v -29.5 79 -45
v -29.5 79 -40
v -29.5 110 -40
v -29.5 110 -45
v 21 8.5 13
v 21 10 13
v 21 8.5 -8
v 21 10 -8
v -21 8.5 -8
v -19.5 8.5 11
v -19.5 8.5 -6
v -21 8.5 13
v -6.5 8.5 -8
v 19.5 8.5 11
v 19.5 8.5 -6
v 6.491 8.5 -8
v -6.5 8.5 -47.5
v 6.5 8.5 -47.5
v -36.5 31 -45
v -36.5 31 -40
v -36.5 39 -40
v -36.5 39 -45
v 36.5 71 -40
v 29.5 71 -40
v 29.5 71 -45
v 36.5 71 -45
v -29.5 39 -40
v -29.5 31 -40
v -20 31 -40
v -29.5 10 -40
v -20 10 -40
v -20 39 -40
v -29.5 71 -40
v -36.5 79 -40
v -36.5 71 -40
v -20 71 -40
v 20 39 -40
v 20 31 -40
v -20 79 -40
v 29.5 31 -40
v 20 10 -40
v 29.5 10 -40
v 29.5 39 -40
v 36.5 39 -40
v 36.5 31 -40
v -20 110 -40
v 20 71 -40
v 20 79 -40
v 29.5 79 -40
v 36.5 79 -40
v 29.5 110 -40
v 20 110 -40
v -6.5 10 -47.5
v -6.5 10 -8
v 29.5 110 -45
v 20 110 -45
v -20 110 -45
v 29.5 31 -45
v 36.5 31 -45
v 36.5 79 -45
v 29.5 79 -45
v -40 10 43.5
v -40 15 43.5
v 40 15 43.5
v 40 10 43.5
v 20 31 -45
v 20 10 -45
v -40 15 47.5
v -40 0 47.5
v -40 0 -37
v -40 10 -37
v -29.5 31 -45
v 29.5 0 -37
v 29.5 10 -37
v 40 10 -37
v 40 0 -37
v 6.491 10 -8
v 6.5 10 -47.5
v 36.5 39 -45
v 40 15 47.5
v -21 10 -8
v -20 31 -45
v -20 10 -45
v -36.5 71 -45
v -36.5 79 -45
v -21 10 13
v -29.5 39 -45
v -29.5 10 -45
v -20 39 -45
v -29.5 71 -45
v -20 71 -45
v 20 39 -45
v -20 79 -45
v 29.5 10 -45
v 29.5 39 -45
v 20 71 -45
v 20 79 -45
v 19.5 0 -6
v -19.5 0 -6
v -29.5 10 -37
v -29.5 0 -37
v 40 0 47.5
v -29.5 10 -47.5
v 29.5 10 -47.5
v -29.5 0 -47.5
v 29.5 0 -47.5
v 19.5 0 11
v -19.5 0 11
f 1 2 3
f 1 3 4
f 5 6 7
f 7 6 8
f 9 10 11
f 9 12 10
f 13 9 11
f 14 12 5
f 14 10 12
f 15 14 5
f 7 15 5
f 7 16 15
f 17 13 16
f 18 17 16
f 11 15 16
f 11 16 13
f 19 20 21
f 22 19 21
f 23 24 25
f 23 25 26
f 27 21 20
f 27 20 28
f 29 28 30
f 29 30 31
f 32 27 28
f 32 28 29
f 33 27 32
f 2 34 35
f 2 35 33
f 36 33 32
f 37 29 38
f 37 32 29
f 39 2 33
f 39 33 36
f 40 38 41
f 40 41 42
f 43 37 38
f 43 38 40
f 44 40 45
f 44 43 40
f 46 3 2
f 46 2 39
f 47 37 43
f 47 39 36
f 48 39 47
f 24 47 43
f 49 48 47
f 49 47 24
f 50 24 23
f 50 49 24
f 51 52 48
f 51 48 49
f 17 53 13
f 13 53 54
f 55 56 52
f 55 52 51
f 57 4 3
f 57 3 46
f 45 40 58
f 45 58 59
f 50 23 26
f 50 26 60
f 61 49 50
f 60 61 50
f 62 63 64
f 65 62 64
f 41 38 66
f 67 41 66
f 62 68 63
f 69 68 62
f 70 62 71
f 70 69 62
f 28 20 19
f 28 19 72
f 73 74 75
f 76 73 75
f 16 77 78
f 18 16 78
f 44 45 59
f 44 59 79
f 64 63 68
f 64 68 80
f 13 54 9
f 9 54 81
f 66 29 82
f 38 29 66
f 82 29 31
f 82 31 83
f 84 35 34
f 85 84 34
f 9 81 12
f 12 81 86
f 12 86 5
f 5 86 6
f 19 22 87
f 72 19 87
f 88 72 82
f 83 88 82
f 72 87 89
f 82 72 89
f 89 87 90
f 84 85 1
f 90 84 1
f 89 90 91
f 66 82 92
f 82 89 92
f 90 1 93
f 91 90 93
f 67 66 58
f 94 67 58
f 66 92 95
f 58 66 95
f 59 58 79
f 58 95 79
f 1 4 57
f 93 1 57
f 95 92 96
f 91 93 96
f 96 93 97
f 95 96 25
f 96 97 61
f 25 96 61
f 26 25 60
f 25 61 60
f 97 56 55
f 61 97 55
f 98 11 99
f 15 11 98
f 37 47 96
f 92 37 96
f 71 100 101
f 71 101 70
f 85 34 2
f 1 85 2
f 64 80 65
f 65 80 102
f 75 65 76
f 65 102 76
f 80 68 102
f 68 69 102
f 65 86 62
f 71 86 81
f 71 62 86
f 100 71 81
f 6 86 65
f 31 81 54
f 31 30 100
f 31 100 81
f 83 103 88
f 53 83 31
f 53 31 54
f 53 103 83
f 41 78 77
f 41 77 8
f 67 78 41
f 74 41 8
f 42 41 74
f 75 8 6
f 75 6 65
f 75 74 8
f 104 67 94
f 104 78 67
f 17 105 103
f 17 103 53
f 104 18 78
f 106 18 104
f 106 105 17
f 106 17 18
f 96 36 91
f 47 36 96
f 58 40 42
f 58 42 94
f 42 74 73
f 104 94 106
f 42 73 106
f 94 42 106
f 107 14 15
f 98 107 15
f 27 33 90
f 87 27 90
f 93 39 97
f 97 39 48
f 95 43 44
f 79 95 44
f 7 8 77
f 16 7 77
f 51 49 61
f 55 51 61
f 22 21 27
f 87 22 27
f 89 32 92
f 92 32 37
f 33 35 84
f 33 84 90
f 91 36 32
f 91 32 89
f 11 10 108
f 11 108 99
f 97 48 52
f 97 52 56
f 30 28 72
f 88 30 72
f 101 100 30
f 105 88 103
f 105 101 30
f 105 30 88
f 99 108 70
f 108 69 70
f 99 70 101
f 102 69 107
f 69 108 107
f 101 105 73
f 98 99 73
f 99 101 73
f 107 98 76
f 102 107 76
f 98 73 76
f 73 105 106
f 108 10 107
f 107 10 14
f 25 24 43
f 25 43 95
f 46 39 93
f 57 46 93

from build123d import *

# Parameters (mm, degrees)
SKETCH1_W           = 80
SKETCH1_H           = 95
BOSS_EXTRUDE1_DEPTH = 10
SKETCH2_W           = 10
SKETCH2_H           = 10
CUT_EXTRUDE1_DEPTH  = 10
SKETCH3_W           = 80
SKETCH3_H           = 5
BOSS_EXTRUDE2_DEPTH = 5
CUT_EXTRUDE2_DEPTH  = 1.5
SKETCH5_W           = 39
SKETCH5_H           = 17
CUT_EXTRUDE3_DEPTH  = 8.5
SKETCH6_W           = 9.5
SKETCH6_H           = 5
BOSS_EXTRUDE3_DEPTH = 100
SKETCH7_W           = 73
SKETCH7_H           = 8
BOSS_EXTRUDE4_DEPTH = 5
SKETCH8_W           = 80
SKETCH8_H           = 1
CUT_EXTRUDE4_DEPTH  = 5
CUT_EXTRUDE5_DEPTH  = 10


with BuildPart() as part:
    # Sketch1 → Boss-Extrude1 (new body)
    with BuildSketch(Plane(origin=(0, 0, 0), x_dir=(1, 0, 0), z_dir=(0, 1, 0))):
        Rectangle(SKETCH1_W, SKETCH1_H)
    extrude(amount=BOSS_EXTRUDE1_DEPTH)

    # Sketch2 → Cut-Extrude1 (cut)
    with BuildSketch(Plane(origin=(0, 10, 0), x_dir=(1, 0, 0), z_dir=(0, 1, 0))):
        with Locations((-35, 42.5)):
            Rectangle(SKETCH2_W, SKETCH2_H)
        with Locations((35, 42.5)):
            Rectangle(SKETCH2_W, SKETCH2_H)
    extrude(amount=-CUT_EXTRUDE1_DEPTH, mode=Mode.SUBTRACT)

    # Sketch3 → Boss-Extrude2 (add)
    with BuildSketch(Plane(origin=(0, 10, 0), x_dir=(1, 0, 0), z_dir=(0, 1, 0))):
        with Locations((0, -45)):
            Rectangle(SKETCH3_W, SKETCH3_H)
    extrude(amount=BOSS_EXTRUDE2_DEPTH)

    # Sketch4 → Cut-Extrude2 (cut)
    with BuildSketch(Plane(origin=(0, 10, 0), x_dir=(1, 0, 0), z_dir=(0, 1, 0))):
        Polygon((-21, -13), (21, -13), (21, 8), (6.491381871, 8), (6.5, 47.5), (-6.5, 47.5), (-6.5, 8), (-21, 8), align=None)
    extrude(amount=-CUT_EXTRUDE2_DEPTH, mode=Mode.SUBTRACT)

    # Sketch5 → Cut-Extrude3 (cut)
    with BuildSketch(Plane(origin=(0, 8.5, 0), x_dir=(1, 0, 0), z_dir=(0, 1, 0))):
        with Locations((0, -2.5)):
            Rectangle(SKETCH5_W, SKETCH5_H)
    extrude(amount=-CUT_EXTRUDE3_DEPTH, mode=Mode.SUBTRACT)

    # Sketch6 → Boss-Extrude3 (add)
    with BuildSketch(Plane(origin=(0, 10, 0), x_dir=(1, 0, 0), z_dir=(0, 1, 0))):
        with Locations((-24.75, 42.5)):
            Rectangle(SKETCH6_W, SKETCH6_H)
        with Locations((24.75, 42.5)):
            Rectangle(SKETCH6_W, SKETCH6_H)
    extrude(amount=BOSS_EXTRUDE3_DEPTH)

    # Sketch7 → Boss-Extrude4 (add)
    with BuildSketch(Plane.XY.offset(-40)):
        with Locations((0, 35)):
            Rectangle(SKETCH7_W, SKETCH7_H)
        with Locations((0, 75)):
            Rectangle(SKETCH7_W, SKETCH7_H)
    extrude(amount=-BOSS_EXTRUDE4_DEPTH)

    # Sketch8 → Cut-Extrude4 (cut)
    with BuildSketch(Plane(origin=(0, 15, 0), x_dir=(1, 0, 0), z_dir=(0, 1, 0))):
        with Locations((0, -43)):
            Rectangle(SKETCH8_W, SKETCH8_H)
    extrude(amount=-CUT_EXTRUDE4_DEPTH, mode=Mode.SUBTRACT)

    # Sketch9 → Cut-Extrude5 (cut)
    with BuildSketch(Plane(origin=(0, 10, 0), x_dir=(1, 0, 0), z_dir=(0, 1, 0))):
        Polygon((30, 47.5), (29.5, 47.5), (29.5, 37), (40, 37), (40, 37.5), (30, 37.5), align=None)
        Polygon((-40, 37.5), (-30, 37.5), (-30, 47.5), (-29.5, 47.5), (-29.5, 37), (-40, 37), align=None)
    extrude(amount=-CUT_EXTRUDE5_DEPTH, mode=Mode.SUBTRACT)


solid = part.part
